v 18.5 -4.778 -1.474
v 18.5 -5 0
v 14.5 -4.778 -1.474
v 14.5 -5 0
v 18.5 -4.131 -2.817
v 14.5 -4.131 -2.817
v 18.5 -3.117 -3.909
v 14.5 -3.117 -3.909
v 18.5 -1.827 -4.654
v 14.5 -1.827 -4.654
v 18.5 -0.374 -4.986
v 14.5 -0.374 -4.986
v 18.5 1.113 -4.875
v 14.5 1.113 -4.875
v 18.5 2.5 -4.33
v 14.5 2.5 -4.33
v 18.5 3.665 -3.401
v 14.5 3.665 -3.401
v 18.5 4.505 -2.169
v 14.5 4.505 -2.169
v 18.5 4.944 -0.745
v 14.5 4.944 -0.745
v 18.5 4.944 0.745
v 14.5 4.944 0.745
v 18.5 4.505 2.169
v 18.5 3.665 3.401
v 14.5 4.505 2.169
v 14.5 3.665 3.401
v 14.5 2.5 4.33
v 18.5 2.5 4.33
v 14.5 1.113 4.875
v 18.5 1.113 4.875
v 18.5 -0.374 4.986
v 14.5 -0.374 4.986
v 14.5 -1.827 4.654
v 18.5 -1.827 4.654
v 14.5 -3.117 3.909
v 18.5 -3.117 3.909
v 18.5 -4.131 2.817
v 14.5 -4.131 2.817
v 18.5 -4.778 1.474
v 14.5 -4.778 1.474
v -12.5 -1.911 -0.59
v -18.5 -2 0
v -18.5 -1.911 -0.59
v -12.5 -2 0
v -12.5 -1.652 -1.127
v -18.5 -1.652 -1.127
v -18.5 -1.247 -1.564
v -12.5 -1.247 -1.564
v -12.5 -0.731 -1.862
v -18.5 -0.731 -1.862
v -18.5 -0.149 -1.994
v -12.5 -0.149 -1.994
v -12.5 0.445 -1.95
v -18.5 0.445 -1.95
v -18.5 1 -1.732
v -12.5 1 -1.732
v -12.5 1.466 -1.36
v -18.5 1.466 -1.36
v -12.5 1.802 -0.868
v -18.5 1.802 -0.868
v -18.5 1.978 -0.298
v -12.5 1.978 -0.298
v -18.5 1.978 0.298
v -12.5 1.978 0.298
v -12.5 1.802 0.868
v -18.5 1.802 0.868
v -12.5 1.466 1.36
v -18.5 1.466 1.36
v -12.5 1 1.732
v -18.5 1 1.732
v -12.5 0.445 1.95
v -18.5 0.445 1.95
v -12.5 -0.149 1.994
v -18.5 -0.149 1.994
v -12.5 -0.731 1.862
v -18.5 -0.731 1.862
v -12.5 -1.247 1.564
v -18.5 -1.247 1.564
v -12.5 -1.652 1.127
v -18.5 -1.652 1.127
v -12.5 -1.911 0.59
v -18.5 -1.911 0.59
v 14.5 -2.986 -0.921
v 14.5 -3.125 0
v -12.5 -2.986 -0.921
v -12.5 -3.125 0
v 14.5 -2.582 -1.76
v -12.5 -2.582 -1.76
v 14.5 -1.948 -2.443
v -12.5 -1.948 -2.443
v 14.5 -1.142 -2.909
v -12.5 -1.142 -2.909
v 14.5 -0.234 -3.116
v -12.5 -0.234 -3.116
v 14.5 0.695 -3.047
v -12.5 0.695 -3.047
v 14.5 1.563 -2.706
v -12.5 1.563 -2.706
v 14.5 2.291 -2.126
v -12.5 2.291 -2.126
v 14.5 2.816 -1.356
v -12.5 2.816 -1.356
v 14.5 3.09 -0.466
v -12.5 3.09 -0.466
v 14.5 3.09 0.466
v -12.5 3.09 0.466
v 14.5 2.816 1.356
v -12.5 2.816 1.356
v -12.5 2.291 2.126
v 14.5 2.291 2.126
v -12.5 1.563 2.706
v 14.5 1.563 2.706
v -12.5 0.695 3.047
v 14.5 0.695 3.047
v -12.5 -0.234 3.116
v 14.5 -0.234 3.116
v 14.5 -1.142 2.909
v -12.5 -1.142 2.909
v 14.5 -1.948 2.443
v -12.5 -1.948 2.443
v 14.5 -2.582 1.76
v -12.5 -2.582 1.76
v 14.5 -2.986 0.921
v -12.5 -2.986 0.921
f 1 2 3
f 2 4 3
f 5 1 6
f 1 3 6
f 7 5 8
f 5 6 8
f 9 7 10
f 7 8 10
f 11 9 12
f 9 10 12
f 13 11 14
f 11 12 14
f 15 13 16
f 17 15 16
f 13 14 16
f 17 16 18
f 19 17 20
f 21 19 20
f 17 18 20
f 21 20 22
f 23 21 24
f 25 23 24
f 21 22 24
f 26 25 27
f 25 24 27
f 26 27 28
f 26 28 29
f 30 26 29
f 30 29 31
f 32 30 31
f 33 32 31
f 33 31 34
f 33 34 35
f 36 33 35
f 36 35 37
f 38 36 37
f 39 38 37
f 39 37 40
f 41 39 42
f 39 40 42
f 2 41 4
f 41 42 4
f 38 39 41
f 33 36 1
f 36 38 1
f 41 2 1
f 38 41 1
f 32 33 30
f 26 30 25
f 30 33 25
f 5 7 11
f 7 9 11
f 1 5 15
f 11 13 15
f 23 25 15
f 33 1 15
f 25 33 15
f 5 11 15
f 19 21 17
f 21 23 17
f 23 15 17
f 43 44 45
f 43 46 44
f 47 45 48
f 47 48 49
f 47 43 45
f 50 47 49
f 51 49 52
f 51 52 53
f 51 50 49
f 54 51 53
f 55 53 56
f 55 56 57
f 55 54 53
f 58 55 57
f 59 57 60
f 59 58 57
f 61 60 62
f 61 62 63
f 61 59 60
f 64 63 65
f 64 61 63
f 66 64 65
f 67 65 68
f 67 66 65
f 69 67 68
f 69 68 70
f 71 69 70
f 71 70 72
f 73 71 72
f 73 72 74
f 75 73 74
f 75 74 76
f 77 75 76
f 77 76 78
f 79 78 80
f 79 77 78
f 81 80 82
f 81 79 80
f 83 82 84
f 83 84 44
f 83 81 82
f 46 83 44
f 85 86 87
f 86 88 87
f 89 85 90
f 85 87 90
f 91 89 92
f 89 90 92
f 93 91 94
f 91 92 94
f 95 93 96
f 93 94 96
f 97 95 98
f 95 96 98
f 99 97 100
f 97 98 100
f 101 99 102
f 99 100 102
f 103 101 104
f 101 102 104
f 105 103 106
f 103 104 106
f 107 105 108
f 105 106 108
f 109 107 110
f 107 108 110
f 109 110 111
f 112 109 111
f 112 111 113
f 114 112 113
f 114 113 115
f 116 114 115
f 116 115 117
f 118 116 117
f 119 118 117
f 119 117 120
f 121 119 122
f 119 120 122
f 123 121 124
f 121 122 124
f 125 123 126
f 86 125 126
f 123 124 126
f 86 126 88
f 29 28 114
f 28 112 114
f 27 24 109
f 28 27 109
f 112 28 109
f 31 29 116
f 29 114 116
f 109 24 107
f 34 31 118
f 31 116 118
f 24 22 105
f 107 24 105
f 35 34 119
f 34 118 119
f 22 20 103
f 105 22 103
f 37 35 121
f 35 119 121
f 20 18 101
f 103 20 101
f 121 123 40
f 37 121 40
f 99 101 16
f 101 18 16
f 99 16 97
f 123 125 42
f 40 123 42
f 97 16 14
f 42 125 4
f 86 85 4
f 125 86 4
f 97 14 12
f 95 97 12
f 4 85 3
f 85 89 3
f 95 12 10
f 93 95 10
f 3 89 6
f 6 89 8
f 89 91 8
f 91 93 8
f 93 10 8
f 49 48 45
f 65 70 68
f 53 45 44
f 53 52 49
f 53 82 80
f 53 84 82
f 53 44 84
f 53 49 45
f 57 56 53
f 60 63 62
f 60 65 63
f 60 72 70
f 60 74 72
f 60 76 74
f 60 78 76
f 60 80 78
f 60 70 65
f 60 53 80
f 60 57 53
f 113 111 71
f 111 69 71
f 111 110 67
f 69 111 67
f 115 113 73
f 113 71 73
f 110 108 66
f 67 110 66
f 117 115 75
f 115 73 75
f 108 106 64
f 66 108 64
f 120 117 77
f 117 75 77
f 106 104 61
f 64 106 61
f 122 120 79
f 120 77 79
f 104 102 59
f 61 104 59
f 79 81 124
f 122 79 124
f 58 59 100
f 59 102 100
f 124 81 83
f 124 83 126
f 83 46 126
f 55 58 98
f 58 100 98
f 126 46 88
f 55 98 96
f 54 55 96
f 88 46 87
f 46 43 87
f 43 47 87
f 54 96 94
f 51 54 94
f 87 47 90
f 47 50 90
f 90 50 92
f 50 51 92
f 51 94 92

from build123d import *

# Parameters (mm, degrees)
SKETCH1_W = 6
SKETCH1_H = 2


with BuildPart() as part:
    # Sketch1 → Revolve1 (revolve)
    with BuildSketch(Plane.XY, mode=Mode.PRIVATE) as revolve1_sk:
        Polygon((-12.5, 2), (-12.5, 0), (14.5, 0), (14.5, 3.125), (-12.5, 3.125), align=None)
        with Locations((-15.5, 1)):
            Rectangle(SKETCH1_W, SKETCH1_H)
        Polygon((14.5, 3.125), (14.5, 0), (18.5, 0), (18.5, 5), (14.5, 5), align=None)
    revolve(revolve1_sk.sketch.rotate(Axis((-18.5, 0, 0), (1, 0, 0)), 180), axis=Axis((-18.5, 0, 0), (1, 0, 0)))


solid = part.part
